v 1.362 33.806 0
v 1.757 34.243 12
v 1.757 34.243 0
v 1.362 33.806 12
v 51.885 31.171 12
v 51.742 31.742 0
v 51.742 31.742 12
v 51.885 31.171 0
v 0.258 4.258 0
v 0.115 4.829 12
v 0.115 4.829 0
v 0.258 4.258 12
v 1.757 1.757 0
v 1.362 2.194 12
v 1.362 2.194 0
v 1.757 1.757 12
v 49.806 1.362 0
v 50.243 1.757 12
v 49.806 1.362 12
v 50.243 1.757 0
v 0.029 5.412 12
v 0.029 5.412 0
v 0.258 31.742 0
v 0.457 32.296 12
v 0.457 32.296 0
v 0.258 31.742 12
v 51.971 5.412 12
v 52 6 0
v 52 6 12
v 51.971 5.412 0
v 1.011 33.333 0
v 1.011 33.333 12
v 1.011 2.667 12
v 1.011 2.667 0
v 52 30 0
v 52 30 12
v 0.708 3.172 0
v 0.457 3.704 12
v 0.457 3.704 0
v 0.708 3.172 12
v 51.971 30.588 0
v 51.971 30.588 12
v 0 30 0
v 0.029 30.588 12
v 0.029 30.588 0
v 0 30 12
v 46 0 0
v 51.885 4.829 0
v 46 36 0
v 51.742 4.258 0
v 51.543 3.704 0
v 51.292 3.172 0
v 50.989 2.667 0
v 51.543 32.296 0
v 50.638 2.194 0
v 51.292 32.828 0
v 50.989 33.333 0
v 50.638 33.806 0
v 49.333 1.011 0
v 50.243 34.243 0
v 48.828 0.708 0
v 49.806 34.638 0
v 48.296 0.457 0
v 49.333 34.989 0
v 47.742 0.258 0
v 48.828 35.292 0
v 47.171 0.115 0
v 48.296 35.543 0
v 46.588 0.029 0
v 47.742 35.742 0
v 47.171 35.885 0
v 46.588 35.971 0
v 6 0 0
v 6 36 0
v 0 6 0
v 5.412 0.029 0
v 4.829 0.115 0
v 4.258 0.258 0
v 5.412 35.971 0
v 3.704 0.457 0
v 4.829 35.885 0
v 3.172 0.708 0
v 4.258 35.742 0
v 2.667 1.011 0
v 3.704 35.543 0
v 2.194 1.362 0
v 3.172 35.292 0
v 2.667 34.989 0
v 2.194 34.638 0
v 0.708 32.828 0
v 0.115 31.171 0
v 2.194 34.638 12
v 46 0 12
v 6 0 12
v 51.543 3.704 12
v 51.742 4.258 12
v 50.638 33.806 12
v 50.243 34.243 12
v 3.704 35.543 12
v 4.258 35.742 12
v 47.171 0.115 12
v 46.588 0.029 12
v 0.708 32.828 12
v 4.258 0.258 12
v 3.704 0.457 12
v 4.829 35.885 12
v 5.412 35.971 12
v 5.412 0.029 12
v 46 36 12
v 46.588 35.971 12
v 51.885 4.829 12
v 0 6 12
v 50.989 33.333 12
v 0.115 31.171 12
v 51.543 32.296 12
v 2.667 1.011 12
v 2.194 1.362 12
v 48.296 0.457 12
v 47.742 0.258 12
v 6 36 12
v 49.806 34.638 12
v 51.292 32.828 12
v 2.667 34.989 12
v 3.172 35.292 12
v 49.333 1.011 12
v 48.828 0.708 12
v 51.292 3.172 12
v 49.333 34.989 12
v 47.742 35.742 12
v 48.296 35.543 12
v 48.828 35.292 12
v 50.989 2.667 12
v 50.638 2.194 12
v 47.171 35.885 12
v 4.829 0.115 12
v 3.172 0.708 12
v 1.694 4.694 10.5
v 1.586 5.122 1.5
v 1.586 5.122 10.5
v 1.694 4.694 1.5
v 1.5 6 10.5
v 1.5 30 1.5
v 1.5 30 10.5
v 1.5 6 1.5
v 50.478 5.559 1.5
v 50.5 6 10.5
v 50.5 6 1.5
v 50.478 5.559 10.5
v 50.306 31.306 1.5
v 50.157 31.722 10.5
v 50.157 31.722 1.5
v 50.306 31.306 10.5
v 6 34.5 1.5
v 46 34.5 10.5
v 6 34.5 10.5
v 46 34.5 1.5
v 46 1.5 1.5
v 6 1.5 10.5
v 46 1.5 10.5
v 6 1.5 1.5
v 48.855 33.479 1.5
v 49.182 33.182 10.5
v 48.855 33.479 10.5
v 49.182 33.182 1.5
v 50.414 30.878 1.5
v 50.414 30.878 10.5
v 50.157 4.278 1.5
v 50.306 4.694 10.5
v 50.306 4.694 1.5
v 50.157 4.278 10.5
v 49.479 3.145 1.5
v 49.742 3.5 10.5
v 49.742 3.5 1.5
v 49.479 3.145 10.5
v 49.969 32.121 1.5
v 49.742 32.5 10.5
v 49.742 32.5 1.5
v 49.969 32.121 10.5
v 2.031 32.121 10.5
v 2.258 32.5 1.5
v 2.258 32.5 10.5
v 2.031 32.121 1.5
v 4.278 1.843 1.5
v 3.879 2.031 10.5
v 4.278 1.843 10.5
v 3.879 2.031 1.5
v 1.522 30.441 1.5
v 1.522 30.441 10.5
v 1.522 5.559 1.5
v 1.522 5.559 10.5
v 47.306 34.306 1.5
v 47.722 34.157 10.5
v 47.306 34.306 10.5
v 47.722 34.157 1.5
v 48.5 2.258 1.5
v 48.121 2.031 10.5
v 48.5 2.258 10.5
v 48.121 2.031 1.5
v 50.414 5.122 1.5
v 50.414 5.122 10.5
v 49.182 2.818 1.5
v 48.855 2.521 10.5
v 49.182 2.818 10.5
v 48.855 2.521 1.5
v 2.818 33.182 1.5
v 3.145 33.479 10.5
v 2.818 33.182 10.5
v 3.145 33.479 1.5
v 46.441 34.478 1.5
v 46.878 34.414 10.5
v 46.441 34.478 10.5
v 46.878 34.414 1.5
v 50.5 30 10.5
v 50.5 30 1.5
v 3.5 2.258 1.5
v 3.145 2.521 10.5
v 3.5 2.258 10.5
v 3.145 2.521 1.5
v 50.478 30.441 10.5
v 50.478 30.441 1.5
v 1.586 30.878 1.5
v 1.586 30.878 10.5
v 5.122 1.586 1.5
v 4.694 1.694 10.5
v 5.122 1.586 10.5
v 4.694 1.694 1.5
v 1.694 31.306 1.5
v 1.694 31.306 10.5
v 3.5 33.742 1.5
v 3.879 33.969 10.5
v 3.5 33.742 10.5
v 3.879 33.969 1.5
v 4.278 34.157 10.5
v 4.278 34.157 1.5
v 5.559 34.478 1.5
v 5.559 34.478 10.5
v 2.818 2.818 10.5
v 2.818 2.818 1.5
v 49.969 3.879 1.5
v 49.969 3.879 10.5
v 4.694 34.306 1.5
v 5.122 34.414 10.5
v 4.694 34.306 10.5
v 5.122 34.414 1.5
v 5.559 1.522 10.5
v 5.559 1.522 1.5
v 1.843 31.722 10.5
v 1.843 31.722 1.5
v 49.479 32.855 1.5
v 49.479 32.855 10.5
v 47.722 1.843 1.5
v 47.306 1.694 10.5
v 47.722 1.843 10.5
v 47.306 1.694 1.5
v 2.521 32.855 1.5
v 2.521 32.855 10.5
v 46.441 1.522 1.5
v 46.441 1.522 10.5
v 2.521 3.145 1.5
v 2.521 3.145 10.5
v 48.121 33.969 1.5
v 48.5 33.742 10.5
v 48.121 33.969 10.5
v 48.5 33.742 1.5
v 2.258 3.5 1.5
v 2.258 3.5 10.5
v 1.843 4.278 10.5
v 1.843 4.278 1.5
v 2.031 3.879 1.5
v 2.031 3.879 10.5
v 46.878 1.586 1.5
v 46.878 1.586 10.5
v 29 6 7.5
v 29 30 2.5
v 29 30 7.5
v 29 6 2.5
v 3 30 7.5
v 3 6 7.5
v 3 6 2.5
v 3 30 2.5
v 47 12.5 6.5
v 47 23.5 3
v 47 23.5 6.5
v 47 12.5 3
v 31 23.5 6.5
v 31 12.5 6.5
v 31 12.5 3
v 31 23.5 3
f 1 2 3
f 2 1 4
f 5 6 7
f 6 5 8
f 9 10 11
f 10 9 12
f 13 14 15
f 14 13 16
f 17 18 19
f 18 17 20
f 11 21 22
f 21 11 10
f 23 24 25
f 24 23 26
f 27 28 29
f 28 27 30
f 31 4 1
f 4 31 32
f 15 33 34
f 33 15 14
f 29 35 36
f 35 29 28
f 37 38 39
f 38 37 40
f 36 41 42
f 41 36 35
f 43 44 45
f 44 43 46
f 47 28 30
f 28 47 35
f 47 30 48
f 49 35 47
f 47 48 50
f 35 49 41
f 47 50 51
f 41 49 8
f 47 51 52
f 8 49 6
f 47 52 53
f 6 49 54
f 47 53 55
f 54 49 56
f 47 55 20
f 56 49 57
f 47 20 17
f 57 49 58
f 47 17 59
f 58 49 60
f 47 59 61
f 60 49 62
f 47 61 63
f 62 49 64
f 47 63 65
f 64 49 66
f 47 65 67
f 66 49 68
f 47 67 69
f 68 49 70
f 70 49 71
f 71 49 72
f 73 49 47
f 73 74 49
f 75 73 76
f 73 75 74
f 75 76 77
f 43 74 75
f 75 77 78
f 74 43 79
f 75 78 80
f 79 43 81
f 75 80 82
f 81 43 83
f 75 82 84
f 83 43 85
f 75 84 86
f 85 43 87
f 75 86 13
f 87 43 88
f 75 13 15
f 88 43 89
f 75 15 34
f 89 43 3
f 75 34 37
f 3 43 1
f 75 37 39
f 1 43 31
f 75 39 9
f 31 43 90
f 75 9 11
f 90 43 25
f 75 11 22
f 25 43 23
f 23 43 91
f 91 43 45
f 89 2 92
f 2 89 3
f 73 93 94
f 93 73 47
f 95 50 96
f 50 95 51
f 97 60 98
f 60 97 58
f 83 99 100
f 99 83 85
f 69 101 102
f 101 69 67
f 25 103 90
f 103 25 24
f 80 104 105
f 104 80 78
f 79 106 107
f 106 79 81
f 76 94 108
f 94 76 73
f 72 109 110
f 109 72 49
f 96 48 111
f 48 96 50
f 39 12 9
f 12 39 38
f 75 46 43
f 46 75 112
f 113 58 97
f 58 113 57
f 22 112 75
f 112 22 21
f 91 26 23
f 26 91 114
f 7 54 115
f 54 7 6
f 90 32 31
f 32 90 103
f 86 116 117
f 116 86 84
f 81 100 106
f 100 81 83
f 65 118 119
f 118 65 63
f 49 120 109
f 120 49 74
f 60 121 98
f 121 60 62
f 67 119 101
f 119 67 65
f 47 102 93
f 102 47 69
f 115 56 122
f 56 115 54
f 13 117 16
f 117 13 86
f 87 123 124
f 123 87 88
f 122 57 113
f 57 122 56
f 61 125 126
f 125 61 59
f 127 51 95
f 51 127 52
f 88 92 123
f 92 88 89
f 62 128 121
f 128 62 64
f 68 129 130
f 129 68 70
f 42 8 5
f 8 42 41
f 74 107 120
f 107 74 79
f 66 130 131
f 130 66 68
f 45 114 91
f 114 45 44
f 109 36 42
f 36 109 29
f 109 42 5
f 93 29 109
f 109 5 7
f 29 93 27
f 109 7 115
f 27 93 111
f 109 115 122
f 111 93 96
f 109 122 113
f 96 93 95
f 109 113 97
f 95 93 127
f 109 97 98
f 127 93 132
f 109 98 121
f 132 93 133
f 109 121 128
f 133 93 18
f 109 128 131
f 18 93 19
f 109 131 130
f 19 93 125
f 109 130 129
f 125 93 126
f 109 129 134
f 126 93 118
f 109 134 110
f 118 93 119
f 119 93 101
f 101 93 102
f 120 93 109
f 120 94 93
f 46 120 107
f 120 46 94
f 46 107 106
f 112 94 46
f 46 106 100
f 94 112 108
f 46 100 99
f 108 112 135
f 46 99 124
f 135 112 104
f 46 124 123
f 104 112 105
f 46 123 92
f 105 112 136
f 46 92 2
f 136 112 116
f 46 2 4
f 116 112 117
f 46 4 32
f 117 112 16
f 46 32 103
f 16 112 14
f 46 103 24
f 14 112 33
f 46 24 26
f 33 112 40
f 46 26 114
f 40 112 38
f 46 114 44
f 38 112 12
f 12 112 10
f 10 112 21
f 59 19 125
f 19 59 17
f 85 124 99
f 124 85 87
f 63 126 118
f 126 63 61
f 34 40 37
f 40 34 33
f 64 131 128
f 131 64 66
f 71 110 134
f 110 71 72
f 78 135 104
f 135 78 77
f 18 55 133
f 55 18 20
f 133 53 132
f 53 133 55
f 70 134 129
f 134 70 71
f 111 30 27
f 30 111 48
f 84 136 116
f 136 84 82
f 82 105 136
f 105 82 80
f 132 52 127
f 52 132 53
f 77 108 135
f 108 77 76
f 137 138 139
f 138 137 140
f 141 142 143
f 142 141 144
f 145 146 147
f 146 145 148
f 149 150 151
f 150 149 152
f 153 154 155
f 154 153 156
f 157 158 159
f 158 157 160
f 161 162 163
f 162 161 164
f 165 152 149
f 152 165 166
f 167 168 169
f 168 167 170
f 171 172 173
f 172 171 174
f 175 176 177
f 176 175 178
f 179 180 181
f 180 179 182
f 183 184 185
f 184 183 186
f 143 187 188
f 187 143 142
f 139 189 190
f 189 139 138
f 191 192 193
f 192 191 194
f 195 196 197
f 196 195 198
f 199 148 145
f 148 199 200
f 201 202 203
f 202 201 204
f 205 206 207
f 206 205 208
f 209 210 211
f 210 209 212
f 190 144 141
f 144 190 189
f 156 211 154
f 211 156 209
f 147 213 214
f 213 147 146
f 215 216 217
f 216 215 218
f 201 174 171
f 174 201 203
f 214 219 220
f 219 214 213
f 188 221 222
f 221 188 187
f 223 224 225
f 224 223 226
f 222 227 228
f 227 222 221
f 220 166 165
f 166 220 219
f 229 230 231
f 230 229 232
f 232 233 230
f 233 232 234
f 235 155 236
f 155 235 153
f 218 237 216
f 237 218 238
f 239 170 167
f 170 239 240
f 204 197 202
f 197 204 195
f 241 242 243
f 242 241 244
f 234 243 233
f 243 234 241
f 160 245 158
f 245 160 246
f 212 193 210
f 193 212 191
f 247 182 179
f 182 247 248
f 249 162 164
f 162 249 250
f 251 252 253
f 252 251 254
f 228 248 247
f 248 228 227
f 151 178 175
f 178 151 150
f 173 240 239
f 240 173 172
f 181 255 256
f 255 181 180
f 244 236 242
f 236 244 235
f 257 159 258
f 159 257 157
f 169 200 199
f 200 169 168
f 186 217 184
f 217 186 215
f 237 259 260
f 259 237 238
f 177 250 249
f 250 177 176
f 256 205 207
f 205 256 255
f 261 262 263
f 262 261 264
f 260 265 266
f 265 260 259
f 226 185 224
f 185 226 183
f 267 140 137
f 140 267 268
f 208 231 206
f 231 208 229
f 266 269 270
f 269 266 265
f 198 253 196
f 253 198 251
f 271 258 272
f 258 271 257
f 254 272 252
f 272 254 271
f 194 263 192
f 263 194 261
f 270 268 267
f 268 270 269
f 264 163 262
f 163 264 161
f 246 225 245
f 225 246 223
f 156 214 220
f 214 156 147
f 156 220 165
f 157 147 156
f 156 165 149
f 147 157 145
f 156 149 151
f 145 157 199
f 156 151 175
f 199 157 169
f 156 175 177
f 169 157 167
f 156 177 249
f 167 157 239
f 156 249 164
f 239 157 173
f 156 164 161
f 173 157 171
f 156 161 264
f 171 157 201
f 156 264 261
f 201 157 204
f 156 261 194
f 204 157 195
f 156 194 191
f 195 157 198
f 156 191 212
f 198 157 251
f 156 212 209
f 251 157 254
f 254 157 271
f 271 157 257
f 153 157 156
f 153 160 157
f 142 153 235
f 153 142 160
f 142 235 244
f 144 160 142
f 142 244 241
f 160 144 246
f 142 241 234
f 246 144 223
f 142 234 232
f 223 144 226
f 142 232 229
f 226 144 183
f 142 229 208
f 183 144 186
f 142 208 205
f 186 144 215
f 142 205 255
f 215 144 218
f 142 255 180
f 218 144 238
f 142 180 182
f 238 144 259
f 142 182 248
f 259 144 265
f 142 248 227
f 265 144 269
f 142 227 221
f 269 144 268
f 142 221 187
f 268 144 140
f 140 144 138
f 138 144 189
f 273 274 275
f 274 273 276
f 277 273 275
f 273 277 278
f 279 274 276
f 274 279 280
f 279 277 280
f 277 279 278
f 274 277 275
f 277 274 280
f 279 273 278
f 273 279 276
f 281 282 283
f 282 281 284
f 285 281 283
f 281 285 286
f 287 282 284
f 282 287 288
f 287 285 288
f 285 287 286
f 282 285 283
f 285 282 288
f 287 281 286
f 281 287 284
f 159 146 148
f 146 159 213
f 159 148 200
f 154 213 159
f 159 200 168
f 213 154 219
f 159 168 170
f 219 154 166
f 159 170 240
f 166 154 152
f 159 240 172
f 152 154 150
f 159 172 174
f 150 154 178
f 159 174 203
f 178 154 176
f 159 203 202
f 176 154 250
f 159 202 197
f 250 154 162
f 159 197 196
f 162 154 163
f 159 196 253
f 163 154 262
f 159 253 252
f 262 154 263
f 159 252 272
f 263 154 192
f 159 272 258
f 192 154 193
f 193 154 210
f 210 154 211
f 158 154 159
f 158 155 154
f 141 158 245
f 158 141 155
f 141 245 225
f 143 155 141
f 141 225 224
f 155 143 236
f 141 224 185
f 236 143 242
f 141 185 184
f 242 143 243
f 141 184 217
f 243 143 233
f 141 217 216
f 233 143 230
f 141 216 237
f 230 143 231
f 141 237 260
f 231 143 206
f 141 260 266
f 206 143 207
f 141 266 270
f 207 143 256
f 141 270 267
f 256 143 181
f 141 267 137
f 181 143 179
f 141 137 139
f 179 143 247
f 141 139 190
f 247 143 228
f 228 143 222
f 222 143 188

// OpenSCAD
// Consta: nominal bench enclosure, not a fabrication release. Units: mm.
// Component heights/reservations are assumptions described in parametros.json.
// Open in OpenSCAD, use show_lid=false to inspect the component reservations.
$fn=64;
L=52; W=36; H=12; wall=1.5; radius=6;
show_lid=true;
show_components=true;
module rounded_body(l,w,h,r){
  linear_extrude(h) hull(){
    translate([r,r]) circle(r=r);
    translate([l-r,r]) circle(r=r);
    translate([r,w-r]) circle(r=r);
    translate([l-r,w-r]) circle(r=r);
  }
}
module shell(){
  difference(){
    rounded_body(L,W,H,radius);
    translate([wall,wall,wall])
      rounded_body(L-2*wall,W-2*wall,H,radius-wall);
  }
}
color([0.96,0.96,0.94]) shell();
if(show_lid) color([0.98,0.98,0.96,0.5])
  translate([0,0,H-wall]) rounded_body(L,W,wall,radius);
if(show_components){
  color([0.7,0.72,0.74]) translate([3,6,2.5]) cube([26,24,5]);
  color([0.12,0.35,0.24]) translate([31,12.5,3]) cube([16,11,3.5]);
}
// CR2032 requires a custom PCB/negative contact, not represented by these boxes.
// No claim that lid retention, cable routing or RF keep-out has been validated.
